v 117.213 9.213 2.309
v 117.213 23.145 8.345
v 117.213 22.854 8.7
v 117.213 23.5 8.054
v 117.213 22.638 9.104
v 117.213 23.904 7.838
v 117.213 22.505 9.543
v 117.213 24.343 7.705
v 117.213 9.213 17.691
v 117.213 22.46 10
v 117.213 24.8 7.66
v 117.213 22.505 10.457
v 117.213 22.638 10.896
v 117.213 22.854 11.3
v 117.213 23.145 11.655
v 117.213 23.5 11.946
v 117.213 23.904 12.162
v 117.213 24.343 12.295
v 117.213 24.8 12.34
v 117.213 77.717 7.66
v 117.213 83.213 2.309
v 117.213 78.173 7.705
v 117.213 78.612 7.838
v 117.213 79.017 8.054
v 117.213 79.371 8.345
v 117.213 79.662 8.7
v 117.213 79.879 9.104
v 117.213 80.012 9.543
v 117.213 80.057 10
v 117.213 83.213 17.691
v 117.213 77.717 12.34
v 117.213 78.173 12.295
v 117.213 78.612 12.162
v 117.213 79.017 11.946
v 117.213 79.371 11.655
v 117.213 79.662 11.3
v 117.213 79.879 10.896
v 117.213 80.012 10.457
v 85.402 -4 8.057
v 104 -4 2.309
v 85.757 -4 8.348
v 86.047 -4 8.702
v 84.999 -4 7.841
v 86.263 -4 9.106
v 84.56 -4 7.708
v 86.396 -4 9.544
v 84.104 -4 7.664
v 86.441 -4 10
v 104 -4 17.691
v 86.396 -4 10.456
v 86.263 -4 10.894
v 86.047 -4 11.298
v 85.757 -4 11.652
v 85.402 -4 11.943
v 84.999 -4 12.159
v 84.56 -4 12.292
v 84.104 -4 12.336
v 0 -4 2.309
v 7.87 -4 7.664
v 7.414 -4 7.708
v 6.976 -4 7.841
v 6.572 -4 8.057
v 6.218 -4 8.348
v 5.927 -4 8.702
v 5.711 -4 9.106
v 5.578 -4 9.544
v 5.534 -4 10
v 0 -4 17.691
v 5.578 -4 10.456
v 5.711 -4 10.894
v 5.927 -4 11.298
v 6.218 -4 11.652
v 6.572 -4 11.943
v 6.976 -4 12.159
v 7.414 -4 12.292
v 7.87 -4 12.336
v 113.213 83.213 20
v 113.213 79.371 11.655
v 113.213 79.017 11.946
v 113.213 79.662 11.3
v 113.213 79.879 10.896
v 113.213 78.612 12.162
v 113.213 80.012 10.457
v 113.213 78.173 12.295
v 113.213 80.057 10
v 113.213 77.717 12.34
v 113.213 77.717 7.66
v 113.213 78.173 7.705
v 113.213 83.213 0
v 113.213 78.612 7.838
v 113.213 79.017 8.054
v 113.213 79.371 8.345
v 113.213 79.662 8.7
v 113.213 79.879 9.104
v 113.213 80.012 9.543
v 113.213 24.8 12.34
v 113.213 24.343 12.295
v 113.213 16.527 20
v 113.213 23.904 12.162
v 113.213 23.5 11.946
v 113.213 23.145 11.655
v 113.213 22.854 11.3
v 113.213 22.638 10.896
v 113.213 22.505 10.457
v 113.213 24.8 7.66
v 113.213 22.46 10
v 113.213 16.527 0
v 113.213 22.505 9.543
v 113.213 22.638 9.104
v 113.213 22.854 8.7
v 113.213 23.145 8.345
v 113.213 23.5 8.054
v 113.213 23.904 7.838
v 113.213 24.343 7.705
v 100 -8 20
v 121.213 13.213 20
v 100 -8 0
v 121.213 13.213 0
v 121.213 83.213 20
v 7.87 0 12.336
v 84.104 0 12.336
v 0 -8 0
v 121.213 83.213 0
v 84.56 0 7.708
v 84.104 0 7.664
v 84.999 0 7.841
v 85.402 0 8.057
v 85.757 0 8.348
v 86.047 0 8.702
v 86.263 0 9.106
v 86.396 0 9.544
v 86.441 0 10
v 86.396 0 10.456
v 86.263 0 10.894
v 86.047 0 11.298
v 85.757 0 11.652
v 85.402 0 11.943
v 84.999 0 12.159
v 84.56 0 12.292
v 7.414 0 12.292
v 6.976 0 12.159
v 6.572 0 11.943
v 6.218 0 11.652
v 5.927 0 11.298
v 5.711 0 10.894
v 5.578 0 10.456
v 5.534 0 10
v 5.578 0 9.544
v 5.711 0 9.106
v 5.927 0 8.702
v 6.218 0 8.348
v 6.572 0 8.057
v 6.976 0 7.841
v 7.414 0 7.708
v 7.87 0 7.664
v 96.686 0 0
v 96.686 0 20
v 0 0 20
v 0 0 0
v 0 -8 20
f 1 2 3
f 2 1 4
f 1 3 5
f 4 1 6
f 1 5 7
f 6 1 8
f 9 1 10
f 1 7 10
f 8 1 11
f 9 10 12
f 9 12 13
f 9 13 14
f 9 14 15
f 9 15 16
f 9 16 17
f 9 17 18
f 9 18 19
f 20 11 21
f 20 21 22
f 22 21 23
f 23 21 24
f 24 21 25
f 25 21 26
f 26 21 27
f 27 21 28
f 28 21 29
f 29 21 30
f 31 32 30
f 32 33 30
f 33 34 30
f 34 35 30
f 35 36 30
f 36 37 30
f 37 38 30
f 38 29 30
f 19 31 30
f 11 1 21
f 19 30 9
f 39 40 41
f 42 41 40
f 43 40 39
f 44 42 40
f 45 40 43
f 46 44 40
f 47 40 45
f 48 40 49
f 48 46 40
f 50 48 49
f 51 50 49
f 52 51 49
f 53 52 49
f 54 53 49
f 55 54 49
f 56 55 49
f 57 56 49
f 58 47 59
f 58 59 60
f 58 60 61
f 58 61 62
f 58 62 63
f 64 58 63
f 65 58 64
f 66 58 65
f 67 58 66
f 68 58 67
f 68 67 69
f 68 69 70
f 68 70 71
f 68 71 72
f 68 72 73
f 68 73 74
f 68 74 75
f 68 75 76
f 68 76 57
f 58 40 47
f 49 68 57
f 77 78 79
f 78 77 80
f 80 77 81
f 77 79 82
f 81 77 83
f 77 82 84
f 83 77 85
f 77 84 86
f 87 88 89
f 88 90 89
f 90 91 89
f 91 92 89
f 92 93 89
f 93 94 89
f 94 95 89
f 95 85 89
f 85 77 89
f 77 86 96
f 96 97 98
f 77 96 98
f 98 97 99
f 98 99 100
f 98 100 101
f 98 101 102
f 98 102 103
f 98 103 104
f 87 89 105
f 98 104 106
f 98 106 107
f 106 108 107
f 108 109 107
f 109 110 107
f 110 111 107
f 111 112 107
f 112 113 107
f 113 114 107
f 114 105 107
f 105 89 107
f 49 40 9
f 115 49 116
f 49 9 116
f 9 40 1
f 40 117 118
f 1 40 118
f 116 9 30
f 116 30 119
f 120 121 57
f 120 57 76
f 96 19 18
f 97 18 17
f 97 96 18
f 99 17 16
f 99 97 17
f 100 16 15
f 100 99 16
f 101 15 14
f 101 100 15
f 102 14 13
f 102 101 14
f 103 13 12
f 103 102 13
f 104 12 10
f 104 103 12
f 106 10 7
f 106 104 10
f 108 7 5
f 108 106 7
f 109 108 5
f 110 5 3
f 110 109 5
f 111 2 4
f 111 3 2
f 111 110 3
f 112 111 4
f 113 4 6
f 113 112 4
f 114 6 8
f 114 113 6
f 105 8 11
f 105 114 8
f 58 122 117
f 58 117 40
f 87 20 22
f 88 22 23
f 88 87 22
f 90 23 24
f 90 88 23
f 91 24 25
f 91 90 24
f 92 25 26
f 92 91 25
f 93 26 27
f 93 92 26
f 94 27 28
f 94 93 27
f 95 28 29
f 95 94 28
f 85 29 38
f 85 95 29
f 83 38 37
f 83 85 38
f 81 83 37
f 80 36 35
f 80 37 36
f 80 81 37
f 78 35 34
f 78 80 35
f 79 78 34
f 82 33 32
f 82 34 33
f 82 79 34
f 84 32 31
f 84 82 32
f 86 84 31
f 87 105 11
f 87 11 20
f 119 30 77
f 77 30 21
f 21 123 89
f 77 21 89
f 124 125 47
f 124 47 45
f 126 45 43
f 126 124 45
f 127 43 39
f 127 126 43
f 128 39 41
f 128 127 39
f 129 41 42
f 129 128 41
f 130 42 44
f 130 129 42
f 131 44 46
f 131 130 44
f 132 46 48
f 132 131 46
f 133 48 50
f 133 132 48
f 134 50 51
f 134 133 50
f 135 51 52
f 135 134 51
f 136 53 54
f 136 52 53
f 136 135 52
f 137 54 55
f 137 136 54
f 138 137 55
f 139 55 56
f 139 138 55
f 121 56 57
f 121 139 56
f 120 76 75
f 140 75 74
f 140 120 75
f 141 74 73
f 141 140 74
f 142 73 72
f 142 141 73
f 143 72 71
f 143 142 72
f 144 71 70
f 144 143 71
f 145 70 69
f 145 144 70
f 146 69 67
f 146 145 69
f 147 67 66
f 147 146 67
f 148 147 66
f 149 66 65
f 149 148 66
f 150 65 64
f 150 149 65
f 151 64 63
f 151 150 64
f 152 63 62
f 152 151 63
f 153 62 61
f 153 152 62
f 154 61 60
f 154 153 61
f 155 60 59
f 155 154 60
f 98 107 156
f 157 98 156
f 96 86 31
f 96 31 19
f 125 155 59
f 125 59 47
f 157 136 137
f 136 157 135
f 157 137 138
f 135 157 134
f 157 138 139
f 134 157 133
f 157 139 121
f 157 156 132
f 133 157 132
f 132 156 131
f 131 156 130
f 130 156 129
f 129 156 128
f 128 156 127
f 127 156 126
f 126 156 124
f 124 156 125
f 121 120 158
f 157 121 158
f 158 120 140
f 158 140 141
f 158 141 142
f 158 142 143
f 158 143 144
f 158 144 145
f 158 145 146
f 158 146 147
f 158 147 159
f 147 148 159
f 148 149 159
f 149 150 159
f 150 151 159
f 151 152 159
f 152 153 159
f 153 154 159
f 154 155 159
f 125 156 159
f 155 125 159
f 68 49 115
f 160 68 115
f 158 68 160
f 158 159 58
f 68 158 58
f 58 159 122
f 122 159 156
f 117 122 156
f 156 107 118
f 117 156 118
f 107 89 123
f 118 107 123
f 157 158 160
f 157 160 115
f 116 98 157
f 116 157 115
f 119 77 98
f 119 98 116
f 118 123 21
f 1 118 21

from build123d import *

# Parameters (mm, degrees)
EXTRUDE_1_DEPTH     = 20
CUT_EXTRUDE_3_DEPTH = 149.381528207
CUT_EXTRUDE_4_DEPTH = 154.011402085
CUT_EXTRUDE_5_DEPTH = 149.381528207
CUT_EXTRUDE_6_DEPTH = 142.921339686


with BuildPart() as part:
    # Эскиз1 → Бобышка-Вытянуть1 (new body)
    with BuildSketch(Plane.XY):
        Polygon((0, 0), (0, -8), (100, -8), (121.213203436, 13.213203436), (121.213203436, 83.213203436), (113.213203436, 83.213203436), (113.213203436, 16.526911935), (96.686291501, 0), align=None)
    extrude(amount=EXTRUDE_1_DEPTH)

    # Эскиз4 → Вырез-Вытянуть3 (cut, through all)
    with BuildSketch(Plane.ZY):
        Polygon((0, -8), (2.309401077, -4), (17.690598923, -4), (20, -8), align=None)
    extrude(amount=-CUT_EXTRUDE_3_DEPTH, mode=Mode.SUBTRACT)

    # Эскиз5 → Вырез-Вытянуть4 (cut, through all)
    with BuildSketch(Plane(origin=(0, 83.213203436, 0), x_dir=(1, 0, 0), z_dir=(0, 1, 0))):
        Polygon((121.213203436, 0), (117.213203436, -2.309401077), (117.213203436, -17.690598923), (121.213203436, -20), align=None)
    extrude(amount=-CUT_EXTRUDE_4_DEPTH, mode=Mode.SUBTRACT)

    # Эскиз6 → Вырез-Вытянуть5 (cut, through all)
    with BuildSketch(Plane(origin=(0, 0, 0), x_dir=(1, 0, 0), z_dir=(0, 1, 0))):
        with BuildLine():
            Line((7.870014132, -7.663568904), (84.104423022, -7.663568904))
            ThreePointArc((84.104423022, -7.663568904), (86.440854117, -10), (84.104423022, -12.336431096))
            Line((84.104423022, -12.336431096), (7.870014132, -12.336431096))
            ThreePointArc((7.870014132, -12.336431096), (5.533583037, -10), (7.870014132, -7.663568904))
        make_face()
    extrude(amount=-CUT_EXTRUDE_5_DEPTH, mode=Mode.SUBTRACT)

    # Эскиз7 → Вырез-Вытянуть6 (cut, through all)
    with BuildSketch(Plane.ZY.offset(-113.213203436)):
        with BuildLine():
            Line((12.340286207, 77.716506994), (12.340286207, 24.800035528))
            ThreePointArc((12.340286207, 24.800035528), (10, 22.45974932), (7.659713793, 24.800035528))
            Line((7.659713793, 24.800035528), (7.659713793, 77.716506994))
            ThreePointArc((7.659713793, 77.716506994), (10, 80.056793201), (12.340286207, 77.716506994))
        make_face()
    extrude(amount=-CUT_EXTRUDE_6_DEPTH, mode=Mode.SUBTRACT)


solid = part.part
